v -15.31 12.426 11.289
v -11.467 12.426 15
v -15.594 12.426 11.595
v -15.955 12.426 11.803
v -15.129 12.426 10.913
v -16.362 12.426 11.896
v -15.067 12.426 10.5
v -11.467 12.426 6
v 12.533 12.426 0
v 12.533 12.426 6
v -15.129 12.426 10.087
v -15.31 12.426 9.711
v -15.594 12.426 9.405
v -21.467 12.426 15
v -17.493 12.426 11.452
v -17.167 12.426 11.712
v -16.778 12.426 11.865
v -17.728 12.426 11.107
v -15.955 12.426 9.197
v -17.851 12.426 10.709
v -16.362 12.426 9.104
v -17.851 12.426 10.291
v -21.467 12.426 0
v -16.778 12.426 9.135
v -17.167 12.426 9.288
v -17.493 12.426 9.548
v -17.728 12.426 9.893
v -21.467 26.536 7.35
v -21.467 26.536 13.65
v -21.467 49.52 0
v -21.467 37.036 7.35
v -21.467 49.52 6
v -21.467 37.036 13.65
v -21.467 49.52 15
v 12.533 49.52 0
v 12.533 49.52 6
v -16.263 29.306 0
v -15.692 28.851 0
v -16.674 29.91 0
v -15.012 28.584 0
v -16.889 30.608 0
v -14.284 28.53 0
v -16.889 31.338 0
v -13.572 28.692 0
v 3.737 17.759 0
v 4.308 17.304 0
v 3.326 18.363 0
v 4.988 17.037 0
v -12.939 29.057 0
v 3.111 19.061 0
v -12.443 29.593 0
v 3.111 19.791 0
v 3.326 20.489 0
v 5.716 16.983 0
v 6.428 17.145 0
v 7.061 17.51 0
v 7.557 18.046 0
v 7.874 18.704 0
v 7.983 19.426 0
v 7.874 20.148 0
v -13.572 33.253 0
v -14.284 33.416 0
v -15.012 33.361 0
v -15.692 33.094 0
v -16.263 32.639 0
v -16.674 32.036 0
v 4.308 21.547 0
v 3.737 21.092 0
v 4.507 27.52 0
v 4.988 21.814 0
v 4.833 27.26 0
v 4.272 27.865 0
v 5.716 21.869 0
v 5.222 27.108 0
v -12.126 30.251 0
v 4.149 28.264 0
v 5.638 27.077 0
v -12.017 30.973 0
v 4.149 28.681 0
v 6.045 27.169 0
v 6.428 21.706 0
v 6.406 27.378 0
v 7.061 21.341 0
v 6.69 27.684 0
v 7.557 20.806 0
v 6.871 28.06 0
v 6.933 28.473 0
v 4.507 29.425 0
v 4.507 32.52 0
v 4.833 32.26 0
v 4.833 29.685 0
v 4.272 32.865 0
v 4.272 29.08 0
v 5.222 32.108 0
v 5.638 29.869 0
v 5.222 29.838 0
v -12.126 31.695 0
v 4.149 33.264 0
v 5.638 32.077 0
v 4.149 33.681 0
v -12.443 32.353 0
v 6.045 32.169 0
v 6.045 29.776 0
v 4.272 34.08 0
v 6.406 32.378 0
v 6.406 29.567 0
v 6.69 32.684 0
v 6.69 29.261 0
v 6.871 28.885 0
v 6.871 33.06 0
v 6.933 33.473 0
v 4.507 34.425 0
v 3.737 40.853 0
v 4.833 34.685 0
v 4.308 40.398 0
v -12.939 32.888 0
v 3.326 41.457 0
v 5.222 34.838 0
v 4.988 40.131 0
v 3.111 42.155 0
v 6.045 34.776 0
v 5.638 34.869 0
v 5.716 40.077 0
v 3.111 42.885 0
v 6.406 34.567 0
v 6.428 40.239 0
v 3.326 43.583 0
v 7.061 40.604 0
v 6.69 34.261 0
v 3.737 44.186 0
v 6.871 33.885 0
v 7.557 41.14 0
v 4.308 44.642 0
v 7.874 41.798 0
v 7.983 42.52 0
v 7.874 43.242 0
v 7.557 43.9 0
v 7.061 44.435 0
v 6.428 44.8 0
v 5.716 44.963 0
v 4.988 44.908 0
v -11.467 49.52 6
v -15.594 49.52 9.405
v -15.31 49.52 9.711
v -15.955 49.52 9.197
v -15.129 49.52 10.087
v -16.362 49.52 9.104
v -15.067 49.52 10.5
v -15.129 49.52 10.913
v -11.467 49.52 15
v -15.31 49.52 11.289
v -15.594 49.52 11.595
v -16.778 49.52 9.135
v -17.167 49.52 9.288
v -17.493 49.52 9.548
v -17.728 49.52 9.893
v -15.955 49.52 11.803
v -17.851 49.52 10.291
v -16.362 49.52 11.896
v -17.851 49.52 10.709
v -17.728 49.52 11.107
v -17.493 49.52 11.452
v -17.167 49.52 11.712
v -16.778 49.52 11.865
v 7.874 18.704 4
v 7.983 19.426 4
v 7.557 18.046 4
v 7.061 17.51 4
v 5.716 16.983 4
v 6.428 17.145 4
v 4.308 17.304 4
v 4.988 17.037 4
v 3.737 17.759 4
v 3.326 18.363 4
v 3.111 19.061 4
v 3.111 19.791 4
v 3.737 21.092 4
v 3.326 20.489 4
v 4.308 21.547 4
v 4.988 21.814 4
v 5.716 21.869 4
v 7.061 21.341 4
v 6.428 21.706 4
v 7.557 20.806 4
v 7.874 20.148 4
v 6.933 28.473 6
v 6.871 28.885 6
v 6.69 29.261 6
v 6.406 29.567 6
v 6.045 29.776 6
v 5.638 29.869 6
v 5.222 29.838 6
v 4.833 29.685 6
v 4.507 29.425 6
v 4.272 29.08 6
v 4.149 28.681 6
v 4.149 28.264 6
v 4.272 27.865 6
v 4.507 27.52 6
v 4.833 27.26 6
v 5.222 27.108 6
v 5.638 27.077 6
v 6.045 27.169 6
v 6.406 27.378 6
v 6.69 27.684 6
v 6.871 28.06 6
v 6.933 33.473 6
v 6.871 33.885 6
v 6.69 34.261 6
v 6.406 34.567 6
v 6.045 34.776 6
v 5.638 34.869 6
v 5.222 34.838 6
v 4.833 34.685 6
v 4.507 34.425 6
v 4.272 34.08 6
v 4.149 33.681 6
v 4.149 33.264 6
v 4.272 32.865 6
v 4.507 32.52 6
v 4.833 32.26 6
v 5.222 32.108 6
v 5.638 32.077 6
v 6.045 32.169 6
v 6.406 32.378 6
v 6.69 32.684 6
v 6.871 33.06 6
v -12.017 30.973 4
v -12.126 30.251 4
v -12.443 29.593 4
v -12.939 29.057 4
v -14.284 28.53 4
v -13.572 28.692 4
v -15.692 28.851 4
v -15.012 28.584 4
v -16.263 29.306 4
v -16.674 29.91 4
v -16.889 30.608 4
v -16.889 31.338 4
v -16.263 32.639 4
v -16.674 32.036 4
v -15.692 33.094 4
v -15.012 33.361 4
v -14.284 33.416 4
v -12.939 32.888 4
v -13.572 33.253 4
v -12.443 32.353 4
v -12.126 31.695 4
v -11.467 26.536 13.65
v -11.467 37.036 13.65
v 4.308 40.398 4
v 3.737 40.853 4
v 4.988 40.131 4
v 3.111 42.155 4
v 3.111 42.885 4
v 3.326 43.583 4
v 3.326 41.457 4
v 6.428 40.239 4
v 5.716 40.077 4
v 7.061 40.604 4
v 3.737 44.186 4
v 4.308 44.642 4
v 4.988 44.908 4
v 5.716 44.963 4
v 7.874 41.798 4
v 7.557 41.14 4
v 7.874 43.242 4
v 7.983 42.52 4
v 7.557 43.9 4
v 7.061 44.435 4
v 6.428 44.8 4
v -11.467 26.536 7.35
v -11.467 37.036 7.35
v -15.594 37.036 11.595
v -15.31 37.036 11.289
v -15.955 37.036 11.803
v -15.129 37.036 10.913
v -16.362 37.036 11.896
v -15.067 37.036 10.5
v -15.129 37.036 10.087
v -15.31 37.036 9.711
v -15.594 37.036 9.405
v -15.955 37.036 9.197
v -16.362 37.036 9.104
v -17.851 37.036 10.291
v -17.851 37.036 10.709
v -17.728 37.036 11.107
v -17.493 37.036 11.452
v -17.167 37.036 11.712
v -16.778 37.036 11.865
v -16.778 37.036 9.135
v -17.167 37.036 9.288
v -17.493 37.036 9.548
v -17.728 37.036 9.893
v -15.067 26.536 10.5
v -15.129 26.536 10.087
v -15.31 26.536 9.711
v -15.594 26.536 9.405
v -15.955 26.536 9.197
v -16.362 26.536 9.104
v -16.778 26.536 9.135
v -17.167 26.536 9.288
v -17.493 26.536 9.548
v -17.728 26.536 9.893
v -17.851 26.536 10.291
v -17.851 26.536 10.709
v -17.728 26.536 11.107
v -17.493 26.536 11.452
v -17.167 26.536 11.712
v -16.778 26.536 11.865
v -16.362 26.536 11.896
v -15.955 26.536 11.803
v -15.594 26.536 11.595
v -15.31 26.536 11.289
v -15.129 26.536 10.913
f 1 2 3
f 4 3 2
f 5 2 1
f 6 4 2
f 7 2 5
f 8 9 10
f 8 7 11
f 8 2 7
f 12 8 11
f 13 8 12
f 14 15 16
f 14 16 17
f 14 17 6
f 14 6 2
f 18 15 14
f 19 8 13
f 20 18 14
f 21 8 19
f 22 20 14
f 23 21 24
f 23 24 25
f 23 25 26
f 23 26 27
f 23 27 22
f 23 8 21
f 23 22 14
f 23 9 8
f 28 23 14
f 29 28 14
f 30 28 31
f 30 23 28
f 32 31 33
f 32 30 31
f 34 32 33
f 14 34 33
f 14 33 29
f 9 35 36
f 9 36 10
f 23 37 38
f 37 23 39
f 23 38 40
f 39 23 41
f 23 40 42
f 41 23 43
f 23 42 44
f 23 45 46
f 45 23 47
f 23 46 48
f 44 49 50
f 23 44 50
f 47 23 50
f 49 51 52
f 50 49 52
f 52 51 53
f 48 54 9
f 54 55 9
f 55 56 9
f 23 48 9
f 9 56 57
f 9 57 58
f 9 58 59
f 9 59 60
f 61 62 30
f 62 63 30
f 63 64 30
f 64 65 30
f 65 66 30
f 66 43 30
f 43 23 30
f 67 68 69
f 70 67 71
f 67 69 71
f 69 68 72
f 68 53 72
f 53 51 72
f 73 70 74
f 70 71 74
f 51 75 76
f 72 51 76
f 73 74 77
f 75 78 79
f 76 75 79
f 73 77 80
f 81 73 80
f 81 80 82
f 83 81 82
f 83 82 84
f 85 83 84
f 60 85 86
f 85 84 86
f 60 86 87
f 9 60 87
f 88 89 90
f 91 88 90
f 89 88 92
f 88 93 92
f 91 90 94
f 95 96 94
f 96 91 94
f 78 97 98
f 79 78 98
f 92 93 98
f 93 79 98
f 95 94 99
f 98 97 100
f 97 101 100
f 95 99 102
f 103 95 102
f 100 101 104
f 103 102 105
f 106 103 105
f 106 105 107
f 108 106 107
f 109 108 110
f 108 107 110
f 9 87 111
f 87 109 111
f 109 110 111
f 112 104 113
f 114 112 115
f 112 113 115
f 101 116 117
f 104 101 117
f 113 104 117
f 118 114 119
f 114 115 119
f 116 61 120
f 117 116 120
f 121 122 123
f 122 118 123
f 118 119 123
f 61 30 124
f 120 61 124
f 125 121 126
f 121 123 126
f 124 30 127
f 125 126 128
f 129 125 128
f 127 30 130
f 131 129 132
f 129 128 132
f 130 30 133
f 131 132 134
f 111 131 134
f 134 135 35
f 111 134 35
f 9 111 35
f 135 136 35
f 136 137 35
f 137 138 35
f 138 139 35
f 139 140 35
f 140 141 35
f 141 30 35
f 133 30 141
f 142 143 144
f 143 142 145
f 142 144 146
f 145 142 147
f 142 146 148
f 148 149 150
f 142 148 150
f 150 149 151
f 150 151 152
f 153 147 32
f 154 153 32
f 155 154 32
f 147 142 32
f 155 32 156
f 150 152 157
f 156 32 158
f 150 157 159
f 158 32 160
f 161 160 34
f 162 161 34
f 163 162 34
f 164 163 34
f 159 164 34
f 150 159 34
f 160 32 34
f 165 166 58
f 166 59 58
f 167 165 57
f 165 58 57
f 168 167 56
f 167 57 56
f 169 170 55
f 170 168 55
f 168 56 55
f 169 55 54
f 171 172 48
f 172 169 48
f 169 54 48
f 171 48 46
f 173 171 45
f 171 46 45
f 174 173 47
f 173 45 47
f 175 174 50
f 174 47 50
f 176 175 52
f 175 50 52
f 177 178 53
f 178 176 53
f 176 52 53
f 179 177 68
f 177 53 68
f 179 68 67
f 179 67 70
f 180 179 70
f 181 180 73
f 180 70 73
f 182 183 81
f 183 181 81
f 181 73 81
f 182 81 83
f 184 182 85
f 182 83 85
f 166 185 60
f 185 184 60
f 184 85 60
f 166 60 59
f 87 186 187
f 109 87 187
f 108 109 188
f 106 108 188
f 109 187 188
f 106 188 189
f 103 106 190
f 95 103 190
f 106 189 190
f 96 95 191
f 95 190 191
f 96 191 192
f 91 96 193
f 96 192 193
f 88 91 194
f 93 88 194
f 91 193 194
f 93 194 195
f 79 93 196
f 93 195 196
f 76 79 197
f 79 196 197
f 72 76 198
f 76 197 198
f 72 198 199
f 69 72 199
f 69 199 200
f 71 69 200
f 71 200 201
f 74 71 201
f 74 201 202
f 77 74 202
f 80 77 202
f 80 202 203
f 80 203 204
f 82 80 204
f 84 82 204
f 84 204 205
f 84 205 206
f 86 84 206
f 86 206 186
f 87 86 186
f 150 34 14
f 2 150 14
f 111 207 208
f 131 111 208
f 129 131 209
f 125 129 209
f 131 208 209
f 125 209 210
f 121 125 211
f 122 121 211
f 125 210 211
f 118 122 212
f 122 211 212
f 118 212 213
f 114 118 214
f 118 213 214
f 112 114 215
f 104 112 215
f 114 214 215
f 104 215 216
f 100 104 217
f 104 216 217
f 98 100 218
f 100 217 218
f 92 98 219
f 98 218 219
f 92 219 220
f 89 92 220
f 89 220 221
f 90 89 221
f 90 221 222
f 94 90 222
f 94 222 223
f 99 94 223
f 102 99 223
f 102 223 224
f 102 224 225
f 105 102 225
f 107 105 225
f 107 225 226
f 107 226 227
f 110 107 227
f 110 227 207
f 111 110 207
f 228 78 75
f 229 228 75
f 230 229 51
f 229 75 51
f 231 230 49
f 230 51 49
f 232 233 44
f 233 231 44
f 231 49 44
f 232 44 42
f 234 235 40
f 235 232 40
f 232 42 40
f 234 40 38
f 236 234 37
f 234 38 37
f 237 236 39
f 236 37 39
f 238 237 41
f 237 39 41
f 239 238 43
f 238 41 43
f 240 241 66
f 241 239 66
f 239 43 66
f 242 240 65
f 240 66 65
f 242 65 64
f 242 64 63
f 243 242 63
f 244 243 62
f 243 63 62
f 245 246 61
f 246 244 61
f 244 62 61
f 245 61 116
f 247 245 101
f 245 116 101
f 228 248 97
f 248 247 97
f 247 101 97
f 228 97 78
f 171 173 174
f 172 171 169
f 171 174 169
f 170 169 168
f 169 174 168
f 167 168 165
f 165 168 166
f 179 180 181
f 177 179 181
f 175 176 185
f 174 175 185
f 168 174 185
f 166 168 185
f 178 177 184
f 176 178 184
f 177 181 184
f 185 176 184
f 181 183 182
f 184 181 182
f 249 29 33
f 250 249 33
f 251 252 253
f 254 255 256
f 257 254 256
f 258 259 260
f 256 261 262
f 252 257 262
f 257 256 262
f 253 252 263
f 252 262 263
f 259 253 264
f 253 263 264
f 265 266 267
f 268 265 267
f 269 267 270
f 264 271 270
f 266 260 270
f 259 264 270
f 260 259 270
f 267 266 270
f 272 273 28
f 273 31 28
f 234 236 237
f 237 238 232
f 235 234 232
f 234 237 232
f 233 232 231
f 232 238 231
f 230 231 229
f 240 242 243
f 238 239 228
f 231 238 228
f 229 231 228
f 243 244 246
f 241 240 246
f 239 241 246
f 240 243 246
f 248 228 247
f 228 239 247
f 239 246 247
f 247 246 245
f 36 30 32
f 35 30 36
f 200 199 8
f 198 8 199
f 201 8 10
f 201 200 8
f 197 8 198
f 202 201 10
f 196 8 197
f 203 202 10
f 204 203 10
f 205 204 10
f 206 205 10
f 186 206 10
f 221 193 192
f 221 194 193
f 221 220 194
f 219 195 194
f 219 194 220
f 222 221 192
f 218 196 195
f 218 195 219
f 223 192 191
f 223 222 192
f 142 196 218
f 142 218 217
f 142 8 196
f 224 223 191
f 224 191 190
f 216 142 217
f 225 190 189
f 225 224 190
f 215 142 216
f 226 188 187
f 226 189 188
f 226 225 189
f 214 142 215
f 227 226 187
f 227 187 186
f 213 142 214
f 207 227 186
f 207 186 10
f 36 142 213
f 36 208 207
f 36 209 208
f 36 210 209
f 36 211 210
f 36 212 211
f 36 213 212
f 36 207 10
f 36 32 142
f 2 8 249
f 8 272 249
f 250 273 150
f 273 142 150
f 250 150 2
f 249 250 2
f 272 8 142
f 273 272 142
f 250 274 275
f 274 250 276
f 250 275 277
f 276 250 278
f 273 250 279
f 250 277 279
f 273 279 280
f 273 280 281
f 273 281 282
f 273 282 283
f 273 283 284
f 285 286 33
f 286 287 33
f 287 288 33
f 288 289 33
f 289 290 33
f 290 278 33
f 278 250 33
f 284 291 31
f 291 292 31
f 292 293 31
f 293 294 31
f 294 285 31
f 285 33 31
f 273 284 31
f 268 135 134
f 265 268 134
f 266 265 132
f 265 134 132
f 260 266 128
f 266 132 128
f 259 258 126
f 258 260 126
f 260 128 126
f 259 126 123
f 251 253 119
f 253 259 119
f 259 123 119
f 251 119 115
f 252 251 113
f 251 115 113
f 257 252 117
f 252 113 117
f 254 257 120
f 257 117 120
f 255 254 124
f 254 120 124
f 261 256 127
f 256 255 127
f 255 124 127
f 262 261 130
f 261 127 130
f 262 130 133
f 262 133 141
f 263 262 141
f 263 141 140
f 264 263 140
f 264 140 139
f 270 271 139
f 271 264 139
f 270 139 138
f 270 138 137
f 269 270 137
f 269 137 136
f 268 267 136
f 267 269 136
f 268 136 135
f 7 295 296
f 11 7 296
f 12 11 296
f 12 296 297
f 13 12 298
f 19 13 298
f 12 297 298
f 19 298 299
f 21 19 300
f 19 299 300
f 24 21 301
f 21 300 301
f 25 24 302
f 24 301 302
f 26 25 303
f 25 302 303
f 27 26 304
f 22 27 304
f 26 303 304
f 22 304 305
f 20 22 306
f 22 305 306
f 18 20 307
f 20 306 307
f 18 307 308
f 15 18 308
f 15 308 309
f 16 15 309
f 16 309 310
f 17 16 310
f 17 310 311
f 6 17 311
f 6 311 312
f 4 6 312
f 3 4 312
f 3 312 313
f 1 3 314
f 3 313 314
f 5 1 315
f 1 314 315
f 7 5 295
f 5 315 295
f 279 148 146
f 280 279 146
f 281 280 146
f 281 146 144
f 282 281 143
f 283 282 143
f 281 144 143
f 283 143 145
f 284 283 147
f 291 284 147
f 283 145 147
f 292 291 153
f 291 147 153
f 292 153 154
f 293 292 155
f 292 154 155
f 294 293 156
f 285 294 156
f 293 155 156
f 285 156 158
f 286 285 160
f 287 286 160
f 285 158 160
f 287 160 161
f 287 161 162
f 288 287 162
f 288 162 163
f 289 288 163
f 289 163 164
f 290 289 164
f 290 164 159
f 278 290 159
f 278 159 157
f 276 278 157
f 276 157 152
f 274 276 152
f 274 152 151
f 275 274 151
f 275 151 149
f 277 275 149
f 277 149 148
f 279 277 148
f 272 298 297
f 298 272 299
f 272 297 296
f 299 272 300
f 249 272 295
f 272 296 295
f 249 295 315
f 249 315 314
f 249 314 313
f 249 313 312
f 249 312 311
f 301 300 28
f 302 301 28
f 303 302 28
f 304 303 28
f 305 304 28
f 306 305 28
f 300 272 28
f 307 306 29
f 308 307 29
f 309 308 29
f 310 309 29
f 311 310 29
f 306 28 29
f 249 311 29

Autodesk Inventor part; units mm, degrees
ref_plane "YZ Plane" through (0, 0, 0) normal (1, 0, 0) x (0, 1, 0)
ref_plane "XZ Plane" through (0, 0, 0) normal (0, 1, 0) x (-1, 0, 0)
ref_plane "XY Plane" through (0, 0, 0) normal (0, 0, 1) x (1, 0, 0)
ref_plane "Work Plane1" through (0, 0, 0) normal (0, 0, 1) x (1, 0, 0)
sketch "Sketch1" plane through (0, 0, 0) normal (0, 0, 1) x (1, 0, 0)
  circle A0 centre (5.5332, 19.4257) radius 2.45 construction
  circle A1 centre (-14.4668, 30.9727) radius 2.45 construction
  circle A2 centre (5.5332, 42.5198) radius 2.45 construction
  line L0 (12.5332, 12.4257) -> (-21.4668, 12.4257)
  line L1 (-21.4668, 12.4257) -> (-21.4668, 49.5198)
  line L2 (-21.4668, 49.5198) -> (12.5332, 49.5198)
  line L3 (12.5332, 49.5198) -> (12.5332, 12.4257)
  circle A3 centre (5.5332, 19.4257) radius 2.45
  circle A4 centre (-14.4668, 30.9727) radius 2.45
  circle A5 centre (5.5332, 42.5198) radius 2.45
  point P0 (0, 0)
  dimension "d0" = 7
  dimension "d1" = 7
  dimension "d2" = 7
  dimension "d3" = 7
  dimension "d4" = 4.9
  dimension "d5" = 4.9
  dimension "d6" = 4.9
extrude "Extrusion1" add sketch "Sketch1" along normal blind 4
sketch "Sketch2" plane through (0, 0, 4) normal (0, 0, 1) x (1, 0, 0)
  line L0 (12.5332, 49.5198) -> (-21.4668, 49.5198) projected
  line L1 (-21.4668, 49.5198) -> (-21.4668, 12.4257) projected
  line L2 (-21.4668, 12.4257) -> (12.5332, 12.4257) projected
  line L3 (12.5332, 12.4257) -> (12.5332, 49.5198) projected
  circle A0 centre (5.5332, 42.5198) radius 2.45 projected
  circle A1 centre (-14.4668, 30.9727) radius 2.45 projected
  circle A2 centre (5.5332, 19.4257) radius 2.45 projected
  point P0 (0, 0)
extrude "Extrusion2" add sketch "Sketch2" along normal blind 2 contours L3 L2 L1 L0 | A0 | A1 | A2
sketch "Sketch3" plane through (-21.4668, 12.4257, 0) normal (-1, 0, 0) x (0, 0, 1)
  line L0 (0, 37.094) -> (0, 0) projected
  line L1 (0, 0) -> (6, 0) projected
  line L2 (6, 37.094) -> (6, 0) projected
  line L3 (0, 37.094) -> (6, 37.094) projected
  line L4 (0, 37.094) -> (6, 37.094) projected
  line L5 (6, 37.094) -> (15, 37.094)
  line L6 (15, 37.094) -> (15, 0)
  line L7 (15, 0) -> (6, 0)
  line L8 (6, 0) -> (6, 37.094)
  circle A0 centre (10.5, 18.8104) radius 1.5
  point P0 (0, -12.4257)
  dimension "d11" = 9
  dimension "d12" = 3
extrude "Extrusion3" add sketch "Sketch3" against normal blind 10 contours L5 L6 L7 L2
sketch "Sketch4" plane through (-21.4668, 12.4257, 0) normal (-1, 0, 0) x (0, 0, 1)
  line L0 (7.55, 24.4104) -> (13.45, 24.4104) projected
  line L1 (13.45, 14.3104) -> (7.55, 14.3104) projected
  line L2 (13.45, 24.4104) -> (7.55, 24.4104)
  line L3 (7.55, 24.4104) -> (7.55, 14.3104)
  line L4 (7.55, 14.3104) -> (13.45, 14.3104)
  line L5 (13.45, 14.3104) -> (13.45, 24.4104)
  line L6 (13.65, 24.6104) -> (7.35, 24.6104)
  line L7 (7.35, 24.6104) -> (7.35, 14.1104)
  line L8 (7.35, 14.1104) -> (13.65, 14.1104)
  line L9 (13.65, 14.1104) -> (13.65, 24.6104)
  point P0 (0, -12.4257)
  dimension "d15" = 0.2
extrude "Extrusion4" cut sketch "Sketch4" against normal blind 10 contours L0 L5 L1 L3 | L9 L8 L7 L6
sketch "Sketch5" plane through (-21.4668, 49.5198, 0) normal (0, 1, 0) x (1, 0, 0)
  line L0 (9.45, -4) -> (4.55, -4) projected
  line L1 (34, 0) -> (0, 0) projected
  line L2 (0, 0) -> (0, -15) projected
  line L3 (0, -15) -> (10, -15) projected
  line L4 (10, -6) -> (10, -15) projected
  line L5 (34, -6) -> (10, -6) projected
  line L6 (34, 0) -> (34, -6) projected
  circle A0 centre (5, -10.5) radius 1.4
  point P0 (21.4668, 0)
  point P1 (4.9, -8.2)
  dimension "d18" = 2.8
extrude "Extrusion5" cut sketch "Sketch5" against normal through all contours A0
sketch "Sketch6" plane through (0, 0, 6) normal (0, 0, 1) x (1, 0, 0)
  line L0 (-11.4668, 49.5198) -> (-11.4668, 12.4257) projected
  line L1 (-11.4668, 12.4257) -> (12.5332, 12.4257) projected
  line L2 (12.5332, 12.4257) -> (12.5332, 49.5198) projected
  line L3 (12.5332, 49.5198) -> (-11.4668, 49.5198) projected
  circle A0 centre (-14.4668, 30.9727) radius 2.45 projected
  circle A1 centre (5.5332, 42.5198) radius 2.45 projected
  circle A2 centre (5.5332, 33.4727) radius 1.4
  circle A3 centre (5.5332, 28.4727) radius 1.4
  point P0 (0, 0)
  dimension "d21" = 2.8
  dimension "d22" = 2.8
  dimension "d23" = 2.5
  dimension "d24" = 2.5
extrude "Extrusion6" cut sketch "Sketch6" along normal through all both and the other way through all contours A2 | A3
equation "\"d5\" = d4"
equation "\"d6\" = d4"
properties part number "30_cellSTORM_UC2_motorized_xystage_coupler_fibermount"
